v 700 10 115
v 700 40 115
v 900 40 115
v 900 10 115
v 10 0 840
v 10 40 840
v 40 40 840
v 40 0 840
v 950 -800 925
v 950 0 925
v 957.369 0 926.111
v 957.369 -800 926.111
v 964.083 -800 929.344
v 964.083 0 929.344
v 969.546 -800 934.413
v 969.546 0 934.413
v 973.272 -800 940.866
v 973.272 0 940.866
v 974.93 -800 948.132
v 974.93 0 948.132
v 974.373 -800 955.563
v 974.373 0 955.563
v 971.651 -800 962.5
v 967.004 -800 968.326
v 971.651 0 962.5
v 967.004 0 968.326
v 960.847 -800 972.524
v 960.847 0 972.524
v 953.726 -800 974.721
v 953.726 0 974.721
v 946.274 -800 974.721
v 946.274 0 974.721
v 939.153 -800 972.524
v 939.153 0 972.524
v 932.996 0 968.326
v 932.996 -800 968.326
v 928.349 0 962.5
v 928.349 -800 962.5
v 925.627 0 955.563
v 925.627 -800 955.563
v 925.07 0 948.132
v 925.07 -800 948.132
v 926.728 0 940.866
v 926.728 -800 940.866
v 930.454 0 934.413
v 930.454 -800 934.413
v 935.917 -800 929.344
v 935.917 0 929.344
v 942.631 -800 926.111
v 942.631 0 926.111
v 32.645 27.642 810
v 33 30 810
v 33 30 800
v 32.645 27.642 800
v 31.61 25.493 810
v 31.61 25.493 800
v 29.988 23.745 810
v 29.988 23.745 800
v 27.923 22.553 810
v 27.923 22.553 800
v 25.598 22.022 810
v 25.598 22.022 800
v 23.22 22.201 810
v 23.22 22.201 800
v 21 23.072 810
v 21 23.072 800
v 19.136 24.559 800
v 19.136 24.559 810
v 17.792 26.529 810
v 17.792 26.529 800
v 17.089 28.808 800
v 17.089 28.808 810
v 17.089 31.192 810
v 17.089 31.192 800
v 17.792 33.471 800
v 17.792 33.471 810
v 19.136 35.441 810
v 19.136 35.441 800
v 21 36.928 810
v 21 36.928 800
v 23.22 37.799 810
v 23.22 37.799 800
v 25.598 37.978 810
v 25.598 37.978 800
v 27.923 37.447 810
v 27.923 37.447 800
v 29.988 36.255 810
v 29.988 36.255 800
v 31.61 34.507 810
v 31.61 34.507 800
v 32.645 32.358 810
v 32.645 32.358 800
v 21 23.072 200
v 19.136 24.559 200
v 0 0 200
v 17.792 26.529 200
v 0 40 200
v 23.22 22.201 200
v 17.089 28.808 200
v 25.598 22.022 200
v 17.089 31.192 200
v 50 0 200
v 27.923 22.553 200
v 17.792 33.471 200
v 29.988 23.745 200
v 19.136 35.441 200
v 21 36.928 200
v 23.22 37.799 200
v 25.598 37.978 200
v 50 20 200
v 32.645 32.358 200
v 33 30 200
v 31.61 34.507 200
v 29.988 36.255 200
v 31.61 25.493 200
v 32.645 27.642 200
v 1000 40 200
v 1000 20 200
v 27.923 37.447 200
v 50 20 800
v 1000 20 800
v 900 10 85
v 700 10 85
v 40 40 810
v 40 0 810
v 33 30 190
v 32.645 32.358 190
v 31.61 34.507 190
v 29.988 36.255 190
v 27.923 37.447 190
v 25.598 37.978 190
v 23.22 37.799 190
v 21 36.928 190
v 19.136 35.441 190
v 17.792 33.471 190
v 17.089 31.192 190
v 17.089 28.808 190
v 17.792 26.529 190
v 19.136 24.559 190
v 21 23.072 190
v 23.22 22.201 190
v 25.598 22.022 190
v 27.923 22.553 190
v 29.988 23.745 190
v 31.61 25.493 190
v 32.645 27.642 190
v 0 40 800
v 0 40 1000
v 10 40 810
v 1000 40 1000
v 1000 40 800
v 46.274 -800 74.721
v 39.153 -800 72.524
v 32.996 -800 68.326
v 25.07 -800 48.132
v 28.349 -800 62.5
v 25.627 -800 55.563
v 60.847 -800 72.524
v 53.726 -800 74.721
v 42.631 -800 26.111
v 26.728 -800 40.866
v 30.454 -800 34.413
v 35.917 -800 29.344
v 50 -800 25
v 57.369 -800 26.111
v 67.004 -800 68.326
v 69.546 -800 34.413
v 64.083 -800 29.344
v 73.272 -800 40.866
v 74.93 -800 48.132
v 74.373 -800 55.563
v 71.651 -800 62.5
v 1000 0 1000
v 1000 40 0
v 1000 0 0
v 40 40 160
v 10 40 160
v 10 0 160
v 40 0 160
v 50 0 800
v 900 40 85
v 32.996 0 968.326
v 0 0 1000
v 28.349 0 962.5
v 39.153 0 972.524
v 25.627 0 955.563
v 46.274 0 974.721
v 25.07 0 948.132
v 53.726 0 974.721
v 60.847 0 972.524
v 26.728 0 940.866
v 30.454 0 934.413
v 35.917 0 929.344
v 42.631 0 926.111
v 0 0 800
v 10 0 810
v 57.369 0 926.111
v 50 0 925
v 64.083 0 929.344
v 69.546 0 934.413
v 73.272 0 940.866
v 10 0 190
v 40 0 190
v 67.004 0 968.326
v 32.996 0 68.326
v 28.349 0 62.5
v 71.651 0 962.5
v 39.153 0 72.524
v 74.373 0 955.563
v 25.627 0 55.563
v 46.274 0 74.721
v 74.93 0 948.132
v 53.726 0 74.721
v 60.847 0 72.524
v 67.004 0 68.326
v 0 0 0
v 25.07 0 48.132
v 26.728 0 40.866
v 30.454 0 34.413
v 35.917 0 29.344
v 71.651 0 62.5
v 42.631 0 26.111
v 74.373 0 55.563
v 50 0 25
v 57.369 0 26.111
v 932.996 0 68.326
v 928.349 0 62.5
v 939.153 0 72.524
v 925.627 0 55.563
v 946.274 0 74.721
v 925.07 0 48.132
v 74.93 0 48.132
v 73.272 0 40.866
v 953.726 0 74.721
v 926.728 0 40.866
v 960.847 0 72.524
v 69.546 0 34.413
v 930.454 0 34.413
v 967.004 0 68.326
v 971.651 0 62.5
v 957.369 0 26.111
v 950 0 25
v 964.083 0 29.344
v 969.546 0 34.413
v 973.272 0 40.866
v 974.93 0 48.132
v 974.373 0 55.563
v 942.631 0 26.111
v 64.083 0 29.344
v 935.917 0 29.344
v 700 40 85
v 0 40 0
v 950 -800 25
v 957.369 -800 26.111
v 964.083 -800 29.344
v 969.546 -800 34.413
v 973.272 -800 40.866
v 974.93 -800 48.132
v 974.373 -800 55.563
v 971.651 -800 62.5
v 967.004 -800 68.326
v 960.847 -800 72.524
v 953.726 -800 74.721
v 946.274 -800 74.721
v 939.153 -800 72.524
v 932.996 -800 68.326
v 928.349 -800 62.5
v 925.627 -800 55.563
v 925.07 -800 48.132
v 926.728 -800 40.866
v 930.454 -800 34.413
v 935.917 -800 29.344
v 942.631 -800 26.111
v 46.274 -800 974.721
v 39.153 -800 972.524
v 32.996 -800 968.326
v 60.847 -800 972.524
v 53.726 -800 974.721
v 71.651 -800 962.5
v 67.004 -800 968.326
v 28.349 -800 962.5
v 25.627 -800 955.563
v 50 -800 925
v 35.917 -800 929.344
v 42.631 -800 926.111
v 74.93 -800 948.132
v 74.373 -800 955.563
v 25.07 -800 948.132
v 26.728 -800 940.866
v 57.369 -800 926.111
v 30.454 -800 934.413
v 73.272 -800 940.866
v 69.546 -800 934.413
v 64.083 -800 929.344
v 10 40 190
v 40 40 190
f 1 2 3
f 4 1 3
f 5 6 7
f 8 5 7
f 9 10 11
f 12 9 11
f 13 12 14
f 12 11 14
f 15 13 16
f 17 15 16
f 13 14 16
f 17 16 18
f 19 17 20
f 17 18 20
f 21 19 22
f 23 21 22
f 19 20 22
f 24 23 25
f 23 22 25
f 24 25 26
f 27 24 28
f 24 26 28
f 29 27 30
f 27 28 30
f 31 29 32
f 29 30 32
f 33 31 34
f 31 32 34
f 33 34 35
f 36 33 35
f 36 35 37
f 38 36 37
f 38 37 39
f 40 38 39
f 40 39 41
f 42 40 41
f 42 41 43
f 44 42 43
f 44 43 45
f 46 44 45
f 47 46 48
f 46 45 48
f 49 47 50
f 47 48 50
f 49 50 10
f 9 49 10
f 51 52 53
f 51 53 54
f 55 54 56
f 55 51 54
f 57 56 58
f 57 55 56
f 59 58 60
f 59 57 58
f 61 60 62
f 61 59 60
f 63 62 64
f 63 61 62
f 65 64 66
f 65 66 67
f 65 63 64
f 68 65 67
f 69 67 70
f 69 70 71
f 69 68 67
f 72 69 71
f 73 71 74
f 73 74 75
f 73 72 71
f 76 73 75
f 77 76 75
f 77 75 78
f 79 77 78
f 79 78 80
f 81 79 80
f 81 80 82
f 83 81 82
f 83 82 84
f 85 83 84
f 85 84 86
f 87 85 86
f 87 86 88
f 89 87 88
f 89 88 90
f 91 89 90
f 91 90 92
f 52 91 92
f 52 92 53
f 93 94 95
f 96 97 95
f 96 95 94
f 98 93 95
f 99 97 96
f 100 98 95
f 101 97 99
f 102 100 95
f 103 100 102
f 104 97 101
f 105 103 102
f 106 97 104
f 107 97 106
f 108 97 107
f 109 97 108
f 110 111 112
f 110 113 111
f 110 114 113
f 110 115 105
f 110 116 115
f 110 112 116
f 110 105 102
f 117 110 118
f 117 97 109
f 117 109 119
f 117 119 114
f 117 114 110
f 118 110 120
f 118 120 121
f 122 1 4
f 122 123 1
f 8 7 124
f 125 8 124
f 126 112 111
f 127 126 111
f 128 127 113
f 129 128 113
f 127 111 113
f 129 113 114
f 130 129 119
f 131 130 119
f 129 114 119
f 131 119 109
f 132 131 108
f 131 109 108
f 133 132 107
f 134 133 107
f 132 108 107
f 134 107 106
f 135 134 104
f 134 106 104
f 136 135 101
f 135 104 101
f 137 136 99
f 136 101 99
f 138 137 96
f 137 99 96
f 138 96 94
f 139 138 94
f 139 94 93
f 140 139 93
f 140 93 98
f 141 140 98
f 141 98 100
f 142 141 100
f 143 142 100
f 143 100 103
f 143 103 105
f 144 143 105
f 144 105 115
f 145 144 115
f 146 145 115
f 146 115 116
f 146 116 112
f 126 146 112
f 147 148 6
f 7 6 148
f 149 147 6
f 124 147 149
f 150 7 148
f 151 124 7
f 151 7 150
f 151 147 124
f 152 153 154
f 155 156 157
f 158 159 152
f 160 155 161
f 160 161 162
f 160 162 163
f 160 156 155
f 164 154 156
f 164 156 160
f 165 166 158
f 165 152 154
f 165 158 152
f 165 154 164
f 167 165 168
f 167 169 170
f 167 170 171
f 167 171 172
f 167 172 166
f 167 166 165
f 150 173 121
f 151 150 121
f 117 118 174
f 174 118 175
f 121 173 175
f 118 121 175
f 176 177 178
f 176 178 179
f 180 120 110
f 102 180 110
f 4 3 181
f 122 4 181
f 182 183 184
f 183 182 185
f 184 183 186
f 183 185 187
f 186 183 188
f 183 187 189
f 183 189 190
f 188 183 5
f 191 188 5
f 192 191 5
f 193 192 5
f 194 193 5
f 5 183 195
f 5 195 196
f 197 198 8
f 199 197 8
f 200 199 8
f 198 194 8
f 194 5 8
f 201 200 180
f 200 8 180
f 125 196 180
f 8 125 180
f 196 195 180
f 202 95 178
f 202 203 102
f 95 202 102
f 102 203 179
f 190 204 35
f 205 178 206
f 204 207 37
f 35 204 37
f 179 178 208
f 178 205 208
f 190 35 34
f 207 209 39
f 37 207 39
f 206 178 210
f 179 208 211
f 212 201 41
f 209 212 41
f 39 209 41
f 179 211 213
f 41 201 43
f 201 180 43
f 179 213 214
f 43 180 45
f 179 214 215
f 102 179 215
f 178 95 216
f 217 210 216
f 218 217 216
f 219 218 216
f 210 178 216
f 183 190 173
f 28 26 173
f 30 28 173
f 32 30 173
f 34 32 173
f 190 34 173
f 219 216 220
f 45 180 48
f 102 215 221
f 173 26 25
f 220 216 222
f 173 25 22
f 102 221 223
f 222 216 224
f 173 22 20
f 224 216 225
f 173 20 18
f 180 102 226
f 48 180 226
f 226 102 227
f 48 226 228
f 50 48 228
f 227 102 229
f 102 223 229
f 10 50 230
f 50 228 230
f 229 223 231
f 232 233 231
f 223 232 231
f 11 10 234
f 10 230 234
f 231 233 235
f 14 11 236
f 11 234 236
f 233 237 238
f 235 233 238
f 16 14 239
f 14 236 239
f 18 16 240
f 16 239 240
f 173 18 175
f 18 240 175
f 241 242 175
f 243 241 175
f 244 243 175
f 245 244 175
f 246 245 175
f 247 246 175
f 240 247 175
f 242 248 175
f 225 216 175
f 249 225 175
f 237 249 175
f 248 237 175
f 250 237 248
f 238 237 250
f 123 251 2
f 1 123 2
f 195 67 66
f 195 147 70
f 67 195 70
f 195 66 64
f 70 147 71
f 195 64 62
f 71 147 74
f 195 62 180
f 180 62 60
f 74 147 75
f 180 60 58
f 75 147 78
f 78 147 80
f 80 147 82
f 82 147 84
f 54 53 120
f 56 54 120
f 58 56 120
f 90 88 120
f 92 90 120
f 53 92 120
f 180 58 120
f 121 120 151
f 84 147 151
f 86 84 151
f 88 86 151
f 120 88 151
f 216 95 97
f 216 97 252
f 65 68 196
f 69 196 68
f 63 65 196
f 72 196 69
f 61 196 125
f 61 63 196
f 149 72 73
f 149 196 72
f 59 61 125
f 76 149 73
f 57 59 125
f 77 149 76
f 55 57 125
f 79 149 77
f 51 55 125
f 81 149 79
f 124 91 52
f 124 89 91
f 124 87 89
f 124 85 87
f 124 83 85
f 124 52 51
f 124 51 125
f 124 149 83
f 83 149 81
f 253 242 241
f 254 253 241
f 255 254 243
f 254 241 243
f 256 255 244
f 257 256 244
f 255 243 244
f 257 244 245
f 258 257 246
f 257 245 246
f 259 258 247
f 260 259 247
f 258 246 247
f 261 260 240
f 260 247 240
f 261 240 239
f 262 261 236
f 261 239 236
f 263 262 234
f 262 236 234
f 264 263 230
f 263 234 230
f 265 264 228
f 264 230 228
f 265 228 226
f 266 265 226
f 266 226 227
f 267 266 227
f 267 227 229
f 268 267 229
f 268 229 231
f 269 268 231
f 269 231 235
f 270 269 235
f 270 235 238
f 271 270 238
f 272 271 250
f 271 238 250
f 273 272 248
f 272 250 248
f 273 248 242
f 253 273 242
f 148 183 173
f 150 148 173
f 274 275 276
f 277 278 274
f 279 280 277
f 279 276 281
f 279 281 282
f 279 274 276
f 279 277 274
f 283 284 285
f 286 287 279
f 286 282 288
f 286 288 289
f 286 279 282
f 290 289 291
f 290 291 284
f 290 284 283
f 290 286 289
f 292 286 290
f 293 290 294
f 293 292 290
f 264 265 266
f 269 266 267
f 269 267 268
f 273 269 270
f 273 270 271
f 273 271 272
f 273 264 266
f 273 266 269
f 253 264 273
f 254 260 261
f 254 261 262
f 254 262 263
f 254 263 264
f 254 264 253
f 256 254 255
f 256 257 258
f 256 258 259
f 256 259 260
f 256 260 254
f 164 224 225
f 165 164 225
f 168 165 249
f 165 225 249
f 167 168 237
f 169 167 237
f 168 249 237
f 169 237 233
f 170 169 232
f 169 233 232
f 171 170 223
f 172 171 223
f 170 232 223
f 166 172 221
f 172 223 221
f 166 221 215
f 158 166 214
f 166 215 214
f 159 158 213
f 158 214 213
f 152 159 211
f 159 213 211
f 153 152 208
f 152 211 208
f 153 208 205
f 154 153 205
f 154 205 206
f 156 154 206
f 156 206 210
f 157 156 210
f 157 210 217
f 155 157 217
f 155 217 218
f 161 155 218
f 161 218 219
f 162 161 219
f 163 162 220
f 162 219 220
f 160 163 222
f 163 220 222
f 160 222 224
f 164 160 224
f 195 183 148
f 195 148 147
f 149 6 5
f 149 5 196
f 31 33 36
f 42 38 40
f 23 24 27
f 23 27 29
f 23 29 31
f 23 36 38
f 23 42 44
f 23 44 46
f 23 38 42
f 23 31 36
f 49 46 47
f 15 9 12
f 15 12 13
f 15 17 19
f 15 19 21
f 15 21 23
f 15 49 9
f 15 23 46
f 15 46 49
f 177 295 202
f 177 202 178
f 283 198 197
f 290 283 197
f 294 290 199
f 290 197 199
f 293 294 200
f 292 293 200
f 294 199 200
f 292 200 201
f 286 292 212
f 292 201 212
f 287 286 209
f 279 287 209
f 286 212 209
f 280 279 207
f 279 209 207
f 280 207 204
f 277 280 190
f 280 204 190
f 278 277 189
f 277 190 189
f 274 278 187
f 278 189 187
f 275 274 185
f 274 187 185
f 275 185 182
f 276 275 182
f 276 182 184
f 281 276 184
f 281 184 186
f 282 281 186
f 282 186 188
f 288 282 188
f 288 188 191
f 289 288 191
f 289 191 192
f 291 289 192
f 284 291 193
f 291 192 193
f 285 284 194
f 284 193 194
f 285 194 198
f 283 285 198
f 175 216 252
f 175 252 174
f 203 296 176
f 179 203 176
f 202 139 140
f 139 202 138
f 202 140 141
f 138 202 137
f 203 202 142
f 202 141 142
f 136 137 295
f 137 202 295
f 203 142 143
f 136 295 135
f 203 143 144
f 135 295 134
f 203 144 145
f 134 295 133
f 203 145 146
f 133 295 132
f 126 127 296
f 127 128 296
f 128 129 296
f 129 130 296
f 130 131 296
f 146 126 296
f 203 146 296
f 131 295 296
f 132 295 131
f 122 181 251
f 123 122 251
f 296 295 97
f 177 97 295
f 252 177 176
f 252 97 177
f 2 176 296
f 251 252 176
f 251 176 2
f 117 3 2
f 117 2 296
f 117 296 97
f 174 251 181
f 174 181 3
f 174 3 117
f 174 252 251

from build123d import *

# Parameters (mm, degrees)
SKETCH1_W           = 1000
SKETCH1_H           = 1000
BOSS_EXTRUDE1_DEPTH = 40
SKETCH2_W           = 1000
SKETCH2_H           = 600
CUT_EXTRUDE1_DEPTH  = 20
SKETCH6_R           = 25
BOSS_EXTRUDE8_DEPTH = 800
SKETCH7_W           = 30
SKETCH7_H           = 30
CUT_EXTRUDE3_DEPTH  = 50
SKETCH8_R           = 8
CUT_EXTRUDE4_DEPTH  = 30
CUT_EXTRUDE5_START  = -30
SKETCH9_R           = 8
CUT_EXTRUDE5_DEPTH  = 30
SKETCH10_W          = 50
SKETCH10_H          = 600
CUT_EXTRUDE6_DEPTH  = 30
CUT_EXTRUDE7_DEPTH  = 30


with BuildPart() as part:
    # Sketch1 → Boss-Extrude1 (new body)
    with BuildSketch(Plane(origin=(0, 0, 0), x_dir=(1, 0, 0), z_dir=(0, 1, 0))):
        with Locations((500, -500)):
            Rectangle(SKETCH1_W, SKETCH1_H)
    extrude(amount=BOSS_EXTRUDE1_DEPTH)

    # Sketch2 → Cut-Extrude1 (cut)
    with BuildSketch(Plane(origin=(0, 40, 0), x_dir=(1, 0, 0), z_dir=(0, 1, 0))):
        with Locations((500, -500)):
            Rectangle(SKETCH2_W, SKETCH2_H)
    extrude(amount=-CUT_EXTRUDE1_DEPTH, mode=Mode.SUBTRACT)

    # Sketch6 → Boss-Extrude8 (add)
    with BuildSketch(Plane(origin=(0, 0, 0), x_dir=(-1, 0, 0), z_dir=(0, -1, 0))):
        with Locations(Location((-50, -950, 0), (0, 0, 90))):
            Circle(SKETCH6_R)
        with Locations(Location((-950, -950, 0), (0, 0, 90))):
            Circle(SKETCH6_R)
        with Locations(Location((-950, -50, 0), (0, 0, 90))):
            Circle(SKETCH6_R)
        with Locations(Location((-50, -50, 0), (0, 0, 90))):
            Circle(SKETCH6_R)
    extrude(amount=BOSS_EXTRUDE8_DEPTH)

    # Sketch7 → Cut-Extrude3 (cut)
    with BuildSketch(Plane(origin=(0, 40, 0), x_dir=(1, 0, 0), z_dir=(0, 1, 0))):
        with Locations((25, -175)):
            Rectangle(SKETCH7_W, SKETCH7_H)
        with Locations((25, -825)):
            Rectangle(SKETCH7_W, SKETCH7_H)
    extrude(amount=-CUT_EXTRUDE3_DEPTH, mode=Mode.SUBTRACT)

    # Sketch8 → Cut-Extrude4 (cut)
    with BuildSketch(Plane.XY.offset(200)):
        with Locations((25, 30)):
            Circle(SKETCH8_R)
    extrude(amount=-CUT_EXTRUDE4_DEPTH, mode=Mode.SUBTRACT)

    # Sketch9 → Cut-Extrude5 (cut)
    with BuildSketch(Plane(origin=(0, 0, 800), x_dir=(-1, 0, 0), z_dir=(0, 0, -1)).offset(CUT_EXTRUDE5_START)):
        with Locations(Location((-25, 30, 0), (0, 0, 180))):
            Circle(SKETCH9_R)
    extrude(amount=CUT_EXTRUDE5_DEPTH, mode=Mode.SUBTRACT)

    # Sketch10 → Cut-Extrude6 (cut)
    with BuildSketch(Plane(origin=(0, 20, 0), x_dir=(1, 0, 0), z_dir=(0, 1, 0))):
        with Locations((25, -500)):
            Rectangle(SKETCH10_W, SKETCH10_H)
    extrude(amount=-CUT_EXTRUDE6_DEPTH, mode=Mode.SUBTRACT)

    # Sketch11 → Cut-Extrude7 (cut)
    with BuildSketch(Plane(origin=(0, 40, 0), x_dir=(1, 0, 0), z_dir=(0, 1, 0))):
        Polygon((700, -115), (900, -115), (900, -100), (900, -85), (700, -85), align=None)
    extrude(amount=-CUT_EXTRUDE7_DEPTH, mode=Mode.SUBTRACT)


solid = part.part
